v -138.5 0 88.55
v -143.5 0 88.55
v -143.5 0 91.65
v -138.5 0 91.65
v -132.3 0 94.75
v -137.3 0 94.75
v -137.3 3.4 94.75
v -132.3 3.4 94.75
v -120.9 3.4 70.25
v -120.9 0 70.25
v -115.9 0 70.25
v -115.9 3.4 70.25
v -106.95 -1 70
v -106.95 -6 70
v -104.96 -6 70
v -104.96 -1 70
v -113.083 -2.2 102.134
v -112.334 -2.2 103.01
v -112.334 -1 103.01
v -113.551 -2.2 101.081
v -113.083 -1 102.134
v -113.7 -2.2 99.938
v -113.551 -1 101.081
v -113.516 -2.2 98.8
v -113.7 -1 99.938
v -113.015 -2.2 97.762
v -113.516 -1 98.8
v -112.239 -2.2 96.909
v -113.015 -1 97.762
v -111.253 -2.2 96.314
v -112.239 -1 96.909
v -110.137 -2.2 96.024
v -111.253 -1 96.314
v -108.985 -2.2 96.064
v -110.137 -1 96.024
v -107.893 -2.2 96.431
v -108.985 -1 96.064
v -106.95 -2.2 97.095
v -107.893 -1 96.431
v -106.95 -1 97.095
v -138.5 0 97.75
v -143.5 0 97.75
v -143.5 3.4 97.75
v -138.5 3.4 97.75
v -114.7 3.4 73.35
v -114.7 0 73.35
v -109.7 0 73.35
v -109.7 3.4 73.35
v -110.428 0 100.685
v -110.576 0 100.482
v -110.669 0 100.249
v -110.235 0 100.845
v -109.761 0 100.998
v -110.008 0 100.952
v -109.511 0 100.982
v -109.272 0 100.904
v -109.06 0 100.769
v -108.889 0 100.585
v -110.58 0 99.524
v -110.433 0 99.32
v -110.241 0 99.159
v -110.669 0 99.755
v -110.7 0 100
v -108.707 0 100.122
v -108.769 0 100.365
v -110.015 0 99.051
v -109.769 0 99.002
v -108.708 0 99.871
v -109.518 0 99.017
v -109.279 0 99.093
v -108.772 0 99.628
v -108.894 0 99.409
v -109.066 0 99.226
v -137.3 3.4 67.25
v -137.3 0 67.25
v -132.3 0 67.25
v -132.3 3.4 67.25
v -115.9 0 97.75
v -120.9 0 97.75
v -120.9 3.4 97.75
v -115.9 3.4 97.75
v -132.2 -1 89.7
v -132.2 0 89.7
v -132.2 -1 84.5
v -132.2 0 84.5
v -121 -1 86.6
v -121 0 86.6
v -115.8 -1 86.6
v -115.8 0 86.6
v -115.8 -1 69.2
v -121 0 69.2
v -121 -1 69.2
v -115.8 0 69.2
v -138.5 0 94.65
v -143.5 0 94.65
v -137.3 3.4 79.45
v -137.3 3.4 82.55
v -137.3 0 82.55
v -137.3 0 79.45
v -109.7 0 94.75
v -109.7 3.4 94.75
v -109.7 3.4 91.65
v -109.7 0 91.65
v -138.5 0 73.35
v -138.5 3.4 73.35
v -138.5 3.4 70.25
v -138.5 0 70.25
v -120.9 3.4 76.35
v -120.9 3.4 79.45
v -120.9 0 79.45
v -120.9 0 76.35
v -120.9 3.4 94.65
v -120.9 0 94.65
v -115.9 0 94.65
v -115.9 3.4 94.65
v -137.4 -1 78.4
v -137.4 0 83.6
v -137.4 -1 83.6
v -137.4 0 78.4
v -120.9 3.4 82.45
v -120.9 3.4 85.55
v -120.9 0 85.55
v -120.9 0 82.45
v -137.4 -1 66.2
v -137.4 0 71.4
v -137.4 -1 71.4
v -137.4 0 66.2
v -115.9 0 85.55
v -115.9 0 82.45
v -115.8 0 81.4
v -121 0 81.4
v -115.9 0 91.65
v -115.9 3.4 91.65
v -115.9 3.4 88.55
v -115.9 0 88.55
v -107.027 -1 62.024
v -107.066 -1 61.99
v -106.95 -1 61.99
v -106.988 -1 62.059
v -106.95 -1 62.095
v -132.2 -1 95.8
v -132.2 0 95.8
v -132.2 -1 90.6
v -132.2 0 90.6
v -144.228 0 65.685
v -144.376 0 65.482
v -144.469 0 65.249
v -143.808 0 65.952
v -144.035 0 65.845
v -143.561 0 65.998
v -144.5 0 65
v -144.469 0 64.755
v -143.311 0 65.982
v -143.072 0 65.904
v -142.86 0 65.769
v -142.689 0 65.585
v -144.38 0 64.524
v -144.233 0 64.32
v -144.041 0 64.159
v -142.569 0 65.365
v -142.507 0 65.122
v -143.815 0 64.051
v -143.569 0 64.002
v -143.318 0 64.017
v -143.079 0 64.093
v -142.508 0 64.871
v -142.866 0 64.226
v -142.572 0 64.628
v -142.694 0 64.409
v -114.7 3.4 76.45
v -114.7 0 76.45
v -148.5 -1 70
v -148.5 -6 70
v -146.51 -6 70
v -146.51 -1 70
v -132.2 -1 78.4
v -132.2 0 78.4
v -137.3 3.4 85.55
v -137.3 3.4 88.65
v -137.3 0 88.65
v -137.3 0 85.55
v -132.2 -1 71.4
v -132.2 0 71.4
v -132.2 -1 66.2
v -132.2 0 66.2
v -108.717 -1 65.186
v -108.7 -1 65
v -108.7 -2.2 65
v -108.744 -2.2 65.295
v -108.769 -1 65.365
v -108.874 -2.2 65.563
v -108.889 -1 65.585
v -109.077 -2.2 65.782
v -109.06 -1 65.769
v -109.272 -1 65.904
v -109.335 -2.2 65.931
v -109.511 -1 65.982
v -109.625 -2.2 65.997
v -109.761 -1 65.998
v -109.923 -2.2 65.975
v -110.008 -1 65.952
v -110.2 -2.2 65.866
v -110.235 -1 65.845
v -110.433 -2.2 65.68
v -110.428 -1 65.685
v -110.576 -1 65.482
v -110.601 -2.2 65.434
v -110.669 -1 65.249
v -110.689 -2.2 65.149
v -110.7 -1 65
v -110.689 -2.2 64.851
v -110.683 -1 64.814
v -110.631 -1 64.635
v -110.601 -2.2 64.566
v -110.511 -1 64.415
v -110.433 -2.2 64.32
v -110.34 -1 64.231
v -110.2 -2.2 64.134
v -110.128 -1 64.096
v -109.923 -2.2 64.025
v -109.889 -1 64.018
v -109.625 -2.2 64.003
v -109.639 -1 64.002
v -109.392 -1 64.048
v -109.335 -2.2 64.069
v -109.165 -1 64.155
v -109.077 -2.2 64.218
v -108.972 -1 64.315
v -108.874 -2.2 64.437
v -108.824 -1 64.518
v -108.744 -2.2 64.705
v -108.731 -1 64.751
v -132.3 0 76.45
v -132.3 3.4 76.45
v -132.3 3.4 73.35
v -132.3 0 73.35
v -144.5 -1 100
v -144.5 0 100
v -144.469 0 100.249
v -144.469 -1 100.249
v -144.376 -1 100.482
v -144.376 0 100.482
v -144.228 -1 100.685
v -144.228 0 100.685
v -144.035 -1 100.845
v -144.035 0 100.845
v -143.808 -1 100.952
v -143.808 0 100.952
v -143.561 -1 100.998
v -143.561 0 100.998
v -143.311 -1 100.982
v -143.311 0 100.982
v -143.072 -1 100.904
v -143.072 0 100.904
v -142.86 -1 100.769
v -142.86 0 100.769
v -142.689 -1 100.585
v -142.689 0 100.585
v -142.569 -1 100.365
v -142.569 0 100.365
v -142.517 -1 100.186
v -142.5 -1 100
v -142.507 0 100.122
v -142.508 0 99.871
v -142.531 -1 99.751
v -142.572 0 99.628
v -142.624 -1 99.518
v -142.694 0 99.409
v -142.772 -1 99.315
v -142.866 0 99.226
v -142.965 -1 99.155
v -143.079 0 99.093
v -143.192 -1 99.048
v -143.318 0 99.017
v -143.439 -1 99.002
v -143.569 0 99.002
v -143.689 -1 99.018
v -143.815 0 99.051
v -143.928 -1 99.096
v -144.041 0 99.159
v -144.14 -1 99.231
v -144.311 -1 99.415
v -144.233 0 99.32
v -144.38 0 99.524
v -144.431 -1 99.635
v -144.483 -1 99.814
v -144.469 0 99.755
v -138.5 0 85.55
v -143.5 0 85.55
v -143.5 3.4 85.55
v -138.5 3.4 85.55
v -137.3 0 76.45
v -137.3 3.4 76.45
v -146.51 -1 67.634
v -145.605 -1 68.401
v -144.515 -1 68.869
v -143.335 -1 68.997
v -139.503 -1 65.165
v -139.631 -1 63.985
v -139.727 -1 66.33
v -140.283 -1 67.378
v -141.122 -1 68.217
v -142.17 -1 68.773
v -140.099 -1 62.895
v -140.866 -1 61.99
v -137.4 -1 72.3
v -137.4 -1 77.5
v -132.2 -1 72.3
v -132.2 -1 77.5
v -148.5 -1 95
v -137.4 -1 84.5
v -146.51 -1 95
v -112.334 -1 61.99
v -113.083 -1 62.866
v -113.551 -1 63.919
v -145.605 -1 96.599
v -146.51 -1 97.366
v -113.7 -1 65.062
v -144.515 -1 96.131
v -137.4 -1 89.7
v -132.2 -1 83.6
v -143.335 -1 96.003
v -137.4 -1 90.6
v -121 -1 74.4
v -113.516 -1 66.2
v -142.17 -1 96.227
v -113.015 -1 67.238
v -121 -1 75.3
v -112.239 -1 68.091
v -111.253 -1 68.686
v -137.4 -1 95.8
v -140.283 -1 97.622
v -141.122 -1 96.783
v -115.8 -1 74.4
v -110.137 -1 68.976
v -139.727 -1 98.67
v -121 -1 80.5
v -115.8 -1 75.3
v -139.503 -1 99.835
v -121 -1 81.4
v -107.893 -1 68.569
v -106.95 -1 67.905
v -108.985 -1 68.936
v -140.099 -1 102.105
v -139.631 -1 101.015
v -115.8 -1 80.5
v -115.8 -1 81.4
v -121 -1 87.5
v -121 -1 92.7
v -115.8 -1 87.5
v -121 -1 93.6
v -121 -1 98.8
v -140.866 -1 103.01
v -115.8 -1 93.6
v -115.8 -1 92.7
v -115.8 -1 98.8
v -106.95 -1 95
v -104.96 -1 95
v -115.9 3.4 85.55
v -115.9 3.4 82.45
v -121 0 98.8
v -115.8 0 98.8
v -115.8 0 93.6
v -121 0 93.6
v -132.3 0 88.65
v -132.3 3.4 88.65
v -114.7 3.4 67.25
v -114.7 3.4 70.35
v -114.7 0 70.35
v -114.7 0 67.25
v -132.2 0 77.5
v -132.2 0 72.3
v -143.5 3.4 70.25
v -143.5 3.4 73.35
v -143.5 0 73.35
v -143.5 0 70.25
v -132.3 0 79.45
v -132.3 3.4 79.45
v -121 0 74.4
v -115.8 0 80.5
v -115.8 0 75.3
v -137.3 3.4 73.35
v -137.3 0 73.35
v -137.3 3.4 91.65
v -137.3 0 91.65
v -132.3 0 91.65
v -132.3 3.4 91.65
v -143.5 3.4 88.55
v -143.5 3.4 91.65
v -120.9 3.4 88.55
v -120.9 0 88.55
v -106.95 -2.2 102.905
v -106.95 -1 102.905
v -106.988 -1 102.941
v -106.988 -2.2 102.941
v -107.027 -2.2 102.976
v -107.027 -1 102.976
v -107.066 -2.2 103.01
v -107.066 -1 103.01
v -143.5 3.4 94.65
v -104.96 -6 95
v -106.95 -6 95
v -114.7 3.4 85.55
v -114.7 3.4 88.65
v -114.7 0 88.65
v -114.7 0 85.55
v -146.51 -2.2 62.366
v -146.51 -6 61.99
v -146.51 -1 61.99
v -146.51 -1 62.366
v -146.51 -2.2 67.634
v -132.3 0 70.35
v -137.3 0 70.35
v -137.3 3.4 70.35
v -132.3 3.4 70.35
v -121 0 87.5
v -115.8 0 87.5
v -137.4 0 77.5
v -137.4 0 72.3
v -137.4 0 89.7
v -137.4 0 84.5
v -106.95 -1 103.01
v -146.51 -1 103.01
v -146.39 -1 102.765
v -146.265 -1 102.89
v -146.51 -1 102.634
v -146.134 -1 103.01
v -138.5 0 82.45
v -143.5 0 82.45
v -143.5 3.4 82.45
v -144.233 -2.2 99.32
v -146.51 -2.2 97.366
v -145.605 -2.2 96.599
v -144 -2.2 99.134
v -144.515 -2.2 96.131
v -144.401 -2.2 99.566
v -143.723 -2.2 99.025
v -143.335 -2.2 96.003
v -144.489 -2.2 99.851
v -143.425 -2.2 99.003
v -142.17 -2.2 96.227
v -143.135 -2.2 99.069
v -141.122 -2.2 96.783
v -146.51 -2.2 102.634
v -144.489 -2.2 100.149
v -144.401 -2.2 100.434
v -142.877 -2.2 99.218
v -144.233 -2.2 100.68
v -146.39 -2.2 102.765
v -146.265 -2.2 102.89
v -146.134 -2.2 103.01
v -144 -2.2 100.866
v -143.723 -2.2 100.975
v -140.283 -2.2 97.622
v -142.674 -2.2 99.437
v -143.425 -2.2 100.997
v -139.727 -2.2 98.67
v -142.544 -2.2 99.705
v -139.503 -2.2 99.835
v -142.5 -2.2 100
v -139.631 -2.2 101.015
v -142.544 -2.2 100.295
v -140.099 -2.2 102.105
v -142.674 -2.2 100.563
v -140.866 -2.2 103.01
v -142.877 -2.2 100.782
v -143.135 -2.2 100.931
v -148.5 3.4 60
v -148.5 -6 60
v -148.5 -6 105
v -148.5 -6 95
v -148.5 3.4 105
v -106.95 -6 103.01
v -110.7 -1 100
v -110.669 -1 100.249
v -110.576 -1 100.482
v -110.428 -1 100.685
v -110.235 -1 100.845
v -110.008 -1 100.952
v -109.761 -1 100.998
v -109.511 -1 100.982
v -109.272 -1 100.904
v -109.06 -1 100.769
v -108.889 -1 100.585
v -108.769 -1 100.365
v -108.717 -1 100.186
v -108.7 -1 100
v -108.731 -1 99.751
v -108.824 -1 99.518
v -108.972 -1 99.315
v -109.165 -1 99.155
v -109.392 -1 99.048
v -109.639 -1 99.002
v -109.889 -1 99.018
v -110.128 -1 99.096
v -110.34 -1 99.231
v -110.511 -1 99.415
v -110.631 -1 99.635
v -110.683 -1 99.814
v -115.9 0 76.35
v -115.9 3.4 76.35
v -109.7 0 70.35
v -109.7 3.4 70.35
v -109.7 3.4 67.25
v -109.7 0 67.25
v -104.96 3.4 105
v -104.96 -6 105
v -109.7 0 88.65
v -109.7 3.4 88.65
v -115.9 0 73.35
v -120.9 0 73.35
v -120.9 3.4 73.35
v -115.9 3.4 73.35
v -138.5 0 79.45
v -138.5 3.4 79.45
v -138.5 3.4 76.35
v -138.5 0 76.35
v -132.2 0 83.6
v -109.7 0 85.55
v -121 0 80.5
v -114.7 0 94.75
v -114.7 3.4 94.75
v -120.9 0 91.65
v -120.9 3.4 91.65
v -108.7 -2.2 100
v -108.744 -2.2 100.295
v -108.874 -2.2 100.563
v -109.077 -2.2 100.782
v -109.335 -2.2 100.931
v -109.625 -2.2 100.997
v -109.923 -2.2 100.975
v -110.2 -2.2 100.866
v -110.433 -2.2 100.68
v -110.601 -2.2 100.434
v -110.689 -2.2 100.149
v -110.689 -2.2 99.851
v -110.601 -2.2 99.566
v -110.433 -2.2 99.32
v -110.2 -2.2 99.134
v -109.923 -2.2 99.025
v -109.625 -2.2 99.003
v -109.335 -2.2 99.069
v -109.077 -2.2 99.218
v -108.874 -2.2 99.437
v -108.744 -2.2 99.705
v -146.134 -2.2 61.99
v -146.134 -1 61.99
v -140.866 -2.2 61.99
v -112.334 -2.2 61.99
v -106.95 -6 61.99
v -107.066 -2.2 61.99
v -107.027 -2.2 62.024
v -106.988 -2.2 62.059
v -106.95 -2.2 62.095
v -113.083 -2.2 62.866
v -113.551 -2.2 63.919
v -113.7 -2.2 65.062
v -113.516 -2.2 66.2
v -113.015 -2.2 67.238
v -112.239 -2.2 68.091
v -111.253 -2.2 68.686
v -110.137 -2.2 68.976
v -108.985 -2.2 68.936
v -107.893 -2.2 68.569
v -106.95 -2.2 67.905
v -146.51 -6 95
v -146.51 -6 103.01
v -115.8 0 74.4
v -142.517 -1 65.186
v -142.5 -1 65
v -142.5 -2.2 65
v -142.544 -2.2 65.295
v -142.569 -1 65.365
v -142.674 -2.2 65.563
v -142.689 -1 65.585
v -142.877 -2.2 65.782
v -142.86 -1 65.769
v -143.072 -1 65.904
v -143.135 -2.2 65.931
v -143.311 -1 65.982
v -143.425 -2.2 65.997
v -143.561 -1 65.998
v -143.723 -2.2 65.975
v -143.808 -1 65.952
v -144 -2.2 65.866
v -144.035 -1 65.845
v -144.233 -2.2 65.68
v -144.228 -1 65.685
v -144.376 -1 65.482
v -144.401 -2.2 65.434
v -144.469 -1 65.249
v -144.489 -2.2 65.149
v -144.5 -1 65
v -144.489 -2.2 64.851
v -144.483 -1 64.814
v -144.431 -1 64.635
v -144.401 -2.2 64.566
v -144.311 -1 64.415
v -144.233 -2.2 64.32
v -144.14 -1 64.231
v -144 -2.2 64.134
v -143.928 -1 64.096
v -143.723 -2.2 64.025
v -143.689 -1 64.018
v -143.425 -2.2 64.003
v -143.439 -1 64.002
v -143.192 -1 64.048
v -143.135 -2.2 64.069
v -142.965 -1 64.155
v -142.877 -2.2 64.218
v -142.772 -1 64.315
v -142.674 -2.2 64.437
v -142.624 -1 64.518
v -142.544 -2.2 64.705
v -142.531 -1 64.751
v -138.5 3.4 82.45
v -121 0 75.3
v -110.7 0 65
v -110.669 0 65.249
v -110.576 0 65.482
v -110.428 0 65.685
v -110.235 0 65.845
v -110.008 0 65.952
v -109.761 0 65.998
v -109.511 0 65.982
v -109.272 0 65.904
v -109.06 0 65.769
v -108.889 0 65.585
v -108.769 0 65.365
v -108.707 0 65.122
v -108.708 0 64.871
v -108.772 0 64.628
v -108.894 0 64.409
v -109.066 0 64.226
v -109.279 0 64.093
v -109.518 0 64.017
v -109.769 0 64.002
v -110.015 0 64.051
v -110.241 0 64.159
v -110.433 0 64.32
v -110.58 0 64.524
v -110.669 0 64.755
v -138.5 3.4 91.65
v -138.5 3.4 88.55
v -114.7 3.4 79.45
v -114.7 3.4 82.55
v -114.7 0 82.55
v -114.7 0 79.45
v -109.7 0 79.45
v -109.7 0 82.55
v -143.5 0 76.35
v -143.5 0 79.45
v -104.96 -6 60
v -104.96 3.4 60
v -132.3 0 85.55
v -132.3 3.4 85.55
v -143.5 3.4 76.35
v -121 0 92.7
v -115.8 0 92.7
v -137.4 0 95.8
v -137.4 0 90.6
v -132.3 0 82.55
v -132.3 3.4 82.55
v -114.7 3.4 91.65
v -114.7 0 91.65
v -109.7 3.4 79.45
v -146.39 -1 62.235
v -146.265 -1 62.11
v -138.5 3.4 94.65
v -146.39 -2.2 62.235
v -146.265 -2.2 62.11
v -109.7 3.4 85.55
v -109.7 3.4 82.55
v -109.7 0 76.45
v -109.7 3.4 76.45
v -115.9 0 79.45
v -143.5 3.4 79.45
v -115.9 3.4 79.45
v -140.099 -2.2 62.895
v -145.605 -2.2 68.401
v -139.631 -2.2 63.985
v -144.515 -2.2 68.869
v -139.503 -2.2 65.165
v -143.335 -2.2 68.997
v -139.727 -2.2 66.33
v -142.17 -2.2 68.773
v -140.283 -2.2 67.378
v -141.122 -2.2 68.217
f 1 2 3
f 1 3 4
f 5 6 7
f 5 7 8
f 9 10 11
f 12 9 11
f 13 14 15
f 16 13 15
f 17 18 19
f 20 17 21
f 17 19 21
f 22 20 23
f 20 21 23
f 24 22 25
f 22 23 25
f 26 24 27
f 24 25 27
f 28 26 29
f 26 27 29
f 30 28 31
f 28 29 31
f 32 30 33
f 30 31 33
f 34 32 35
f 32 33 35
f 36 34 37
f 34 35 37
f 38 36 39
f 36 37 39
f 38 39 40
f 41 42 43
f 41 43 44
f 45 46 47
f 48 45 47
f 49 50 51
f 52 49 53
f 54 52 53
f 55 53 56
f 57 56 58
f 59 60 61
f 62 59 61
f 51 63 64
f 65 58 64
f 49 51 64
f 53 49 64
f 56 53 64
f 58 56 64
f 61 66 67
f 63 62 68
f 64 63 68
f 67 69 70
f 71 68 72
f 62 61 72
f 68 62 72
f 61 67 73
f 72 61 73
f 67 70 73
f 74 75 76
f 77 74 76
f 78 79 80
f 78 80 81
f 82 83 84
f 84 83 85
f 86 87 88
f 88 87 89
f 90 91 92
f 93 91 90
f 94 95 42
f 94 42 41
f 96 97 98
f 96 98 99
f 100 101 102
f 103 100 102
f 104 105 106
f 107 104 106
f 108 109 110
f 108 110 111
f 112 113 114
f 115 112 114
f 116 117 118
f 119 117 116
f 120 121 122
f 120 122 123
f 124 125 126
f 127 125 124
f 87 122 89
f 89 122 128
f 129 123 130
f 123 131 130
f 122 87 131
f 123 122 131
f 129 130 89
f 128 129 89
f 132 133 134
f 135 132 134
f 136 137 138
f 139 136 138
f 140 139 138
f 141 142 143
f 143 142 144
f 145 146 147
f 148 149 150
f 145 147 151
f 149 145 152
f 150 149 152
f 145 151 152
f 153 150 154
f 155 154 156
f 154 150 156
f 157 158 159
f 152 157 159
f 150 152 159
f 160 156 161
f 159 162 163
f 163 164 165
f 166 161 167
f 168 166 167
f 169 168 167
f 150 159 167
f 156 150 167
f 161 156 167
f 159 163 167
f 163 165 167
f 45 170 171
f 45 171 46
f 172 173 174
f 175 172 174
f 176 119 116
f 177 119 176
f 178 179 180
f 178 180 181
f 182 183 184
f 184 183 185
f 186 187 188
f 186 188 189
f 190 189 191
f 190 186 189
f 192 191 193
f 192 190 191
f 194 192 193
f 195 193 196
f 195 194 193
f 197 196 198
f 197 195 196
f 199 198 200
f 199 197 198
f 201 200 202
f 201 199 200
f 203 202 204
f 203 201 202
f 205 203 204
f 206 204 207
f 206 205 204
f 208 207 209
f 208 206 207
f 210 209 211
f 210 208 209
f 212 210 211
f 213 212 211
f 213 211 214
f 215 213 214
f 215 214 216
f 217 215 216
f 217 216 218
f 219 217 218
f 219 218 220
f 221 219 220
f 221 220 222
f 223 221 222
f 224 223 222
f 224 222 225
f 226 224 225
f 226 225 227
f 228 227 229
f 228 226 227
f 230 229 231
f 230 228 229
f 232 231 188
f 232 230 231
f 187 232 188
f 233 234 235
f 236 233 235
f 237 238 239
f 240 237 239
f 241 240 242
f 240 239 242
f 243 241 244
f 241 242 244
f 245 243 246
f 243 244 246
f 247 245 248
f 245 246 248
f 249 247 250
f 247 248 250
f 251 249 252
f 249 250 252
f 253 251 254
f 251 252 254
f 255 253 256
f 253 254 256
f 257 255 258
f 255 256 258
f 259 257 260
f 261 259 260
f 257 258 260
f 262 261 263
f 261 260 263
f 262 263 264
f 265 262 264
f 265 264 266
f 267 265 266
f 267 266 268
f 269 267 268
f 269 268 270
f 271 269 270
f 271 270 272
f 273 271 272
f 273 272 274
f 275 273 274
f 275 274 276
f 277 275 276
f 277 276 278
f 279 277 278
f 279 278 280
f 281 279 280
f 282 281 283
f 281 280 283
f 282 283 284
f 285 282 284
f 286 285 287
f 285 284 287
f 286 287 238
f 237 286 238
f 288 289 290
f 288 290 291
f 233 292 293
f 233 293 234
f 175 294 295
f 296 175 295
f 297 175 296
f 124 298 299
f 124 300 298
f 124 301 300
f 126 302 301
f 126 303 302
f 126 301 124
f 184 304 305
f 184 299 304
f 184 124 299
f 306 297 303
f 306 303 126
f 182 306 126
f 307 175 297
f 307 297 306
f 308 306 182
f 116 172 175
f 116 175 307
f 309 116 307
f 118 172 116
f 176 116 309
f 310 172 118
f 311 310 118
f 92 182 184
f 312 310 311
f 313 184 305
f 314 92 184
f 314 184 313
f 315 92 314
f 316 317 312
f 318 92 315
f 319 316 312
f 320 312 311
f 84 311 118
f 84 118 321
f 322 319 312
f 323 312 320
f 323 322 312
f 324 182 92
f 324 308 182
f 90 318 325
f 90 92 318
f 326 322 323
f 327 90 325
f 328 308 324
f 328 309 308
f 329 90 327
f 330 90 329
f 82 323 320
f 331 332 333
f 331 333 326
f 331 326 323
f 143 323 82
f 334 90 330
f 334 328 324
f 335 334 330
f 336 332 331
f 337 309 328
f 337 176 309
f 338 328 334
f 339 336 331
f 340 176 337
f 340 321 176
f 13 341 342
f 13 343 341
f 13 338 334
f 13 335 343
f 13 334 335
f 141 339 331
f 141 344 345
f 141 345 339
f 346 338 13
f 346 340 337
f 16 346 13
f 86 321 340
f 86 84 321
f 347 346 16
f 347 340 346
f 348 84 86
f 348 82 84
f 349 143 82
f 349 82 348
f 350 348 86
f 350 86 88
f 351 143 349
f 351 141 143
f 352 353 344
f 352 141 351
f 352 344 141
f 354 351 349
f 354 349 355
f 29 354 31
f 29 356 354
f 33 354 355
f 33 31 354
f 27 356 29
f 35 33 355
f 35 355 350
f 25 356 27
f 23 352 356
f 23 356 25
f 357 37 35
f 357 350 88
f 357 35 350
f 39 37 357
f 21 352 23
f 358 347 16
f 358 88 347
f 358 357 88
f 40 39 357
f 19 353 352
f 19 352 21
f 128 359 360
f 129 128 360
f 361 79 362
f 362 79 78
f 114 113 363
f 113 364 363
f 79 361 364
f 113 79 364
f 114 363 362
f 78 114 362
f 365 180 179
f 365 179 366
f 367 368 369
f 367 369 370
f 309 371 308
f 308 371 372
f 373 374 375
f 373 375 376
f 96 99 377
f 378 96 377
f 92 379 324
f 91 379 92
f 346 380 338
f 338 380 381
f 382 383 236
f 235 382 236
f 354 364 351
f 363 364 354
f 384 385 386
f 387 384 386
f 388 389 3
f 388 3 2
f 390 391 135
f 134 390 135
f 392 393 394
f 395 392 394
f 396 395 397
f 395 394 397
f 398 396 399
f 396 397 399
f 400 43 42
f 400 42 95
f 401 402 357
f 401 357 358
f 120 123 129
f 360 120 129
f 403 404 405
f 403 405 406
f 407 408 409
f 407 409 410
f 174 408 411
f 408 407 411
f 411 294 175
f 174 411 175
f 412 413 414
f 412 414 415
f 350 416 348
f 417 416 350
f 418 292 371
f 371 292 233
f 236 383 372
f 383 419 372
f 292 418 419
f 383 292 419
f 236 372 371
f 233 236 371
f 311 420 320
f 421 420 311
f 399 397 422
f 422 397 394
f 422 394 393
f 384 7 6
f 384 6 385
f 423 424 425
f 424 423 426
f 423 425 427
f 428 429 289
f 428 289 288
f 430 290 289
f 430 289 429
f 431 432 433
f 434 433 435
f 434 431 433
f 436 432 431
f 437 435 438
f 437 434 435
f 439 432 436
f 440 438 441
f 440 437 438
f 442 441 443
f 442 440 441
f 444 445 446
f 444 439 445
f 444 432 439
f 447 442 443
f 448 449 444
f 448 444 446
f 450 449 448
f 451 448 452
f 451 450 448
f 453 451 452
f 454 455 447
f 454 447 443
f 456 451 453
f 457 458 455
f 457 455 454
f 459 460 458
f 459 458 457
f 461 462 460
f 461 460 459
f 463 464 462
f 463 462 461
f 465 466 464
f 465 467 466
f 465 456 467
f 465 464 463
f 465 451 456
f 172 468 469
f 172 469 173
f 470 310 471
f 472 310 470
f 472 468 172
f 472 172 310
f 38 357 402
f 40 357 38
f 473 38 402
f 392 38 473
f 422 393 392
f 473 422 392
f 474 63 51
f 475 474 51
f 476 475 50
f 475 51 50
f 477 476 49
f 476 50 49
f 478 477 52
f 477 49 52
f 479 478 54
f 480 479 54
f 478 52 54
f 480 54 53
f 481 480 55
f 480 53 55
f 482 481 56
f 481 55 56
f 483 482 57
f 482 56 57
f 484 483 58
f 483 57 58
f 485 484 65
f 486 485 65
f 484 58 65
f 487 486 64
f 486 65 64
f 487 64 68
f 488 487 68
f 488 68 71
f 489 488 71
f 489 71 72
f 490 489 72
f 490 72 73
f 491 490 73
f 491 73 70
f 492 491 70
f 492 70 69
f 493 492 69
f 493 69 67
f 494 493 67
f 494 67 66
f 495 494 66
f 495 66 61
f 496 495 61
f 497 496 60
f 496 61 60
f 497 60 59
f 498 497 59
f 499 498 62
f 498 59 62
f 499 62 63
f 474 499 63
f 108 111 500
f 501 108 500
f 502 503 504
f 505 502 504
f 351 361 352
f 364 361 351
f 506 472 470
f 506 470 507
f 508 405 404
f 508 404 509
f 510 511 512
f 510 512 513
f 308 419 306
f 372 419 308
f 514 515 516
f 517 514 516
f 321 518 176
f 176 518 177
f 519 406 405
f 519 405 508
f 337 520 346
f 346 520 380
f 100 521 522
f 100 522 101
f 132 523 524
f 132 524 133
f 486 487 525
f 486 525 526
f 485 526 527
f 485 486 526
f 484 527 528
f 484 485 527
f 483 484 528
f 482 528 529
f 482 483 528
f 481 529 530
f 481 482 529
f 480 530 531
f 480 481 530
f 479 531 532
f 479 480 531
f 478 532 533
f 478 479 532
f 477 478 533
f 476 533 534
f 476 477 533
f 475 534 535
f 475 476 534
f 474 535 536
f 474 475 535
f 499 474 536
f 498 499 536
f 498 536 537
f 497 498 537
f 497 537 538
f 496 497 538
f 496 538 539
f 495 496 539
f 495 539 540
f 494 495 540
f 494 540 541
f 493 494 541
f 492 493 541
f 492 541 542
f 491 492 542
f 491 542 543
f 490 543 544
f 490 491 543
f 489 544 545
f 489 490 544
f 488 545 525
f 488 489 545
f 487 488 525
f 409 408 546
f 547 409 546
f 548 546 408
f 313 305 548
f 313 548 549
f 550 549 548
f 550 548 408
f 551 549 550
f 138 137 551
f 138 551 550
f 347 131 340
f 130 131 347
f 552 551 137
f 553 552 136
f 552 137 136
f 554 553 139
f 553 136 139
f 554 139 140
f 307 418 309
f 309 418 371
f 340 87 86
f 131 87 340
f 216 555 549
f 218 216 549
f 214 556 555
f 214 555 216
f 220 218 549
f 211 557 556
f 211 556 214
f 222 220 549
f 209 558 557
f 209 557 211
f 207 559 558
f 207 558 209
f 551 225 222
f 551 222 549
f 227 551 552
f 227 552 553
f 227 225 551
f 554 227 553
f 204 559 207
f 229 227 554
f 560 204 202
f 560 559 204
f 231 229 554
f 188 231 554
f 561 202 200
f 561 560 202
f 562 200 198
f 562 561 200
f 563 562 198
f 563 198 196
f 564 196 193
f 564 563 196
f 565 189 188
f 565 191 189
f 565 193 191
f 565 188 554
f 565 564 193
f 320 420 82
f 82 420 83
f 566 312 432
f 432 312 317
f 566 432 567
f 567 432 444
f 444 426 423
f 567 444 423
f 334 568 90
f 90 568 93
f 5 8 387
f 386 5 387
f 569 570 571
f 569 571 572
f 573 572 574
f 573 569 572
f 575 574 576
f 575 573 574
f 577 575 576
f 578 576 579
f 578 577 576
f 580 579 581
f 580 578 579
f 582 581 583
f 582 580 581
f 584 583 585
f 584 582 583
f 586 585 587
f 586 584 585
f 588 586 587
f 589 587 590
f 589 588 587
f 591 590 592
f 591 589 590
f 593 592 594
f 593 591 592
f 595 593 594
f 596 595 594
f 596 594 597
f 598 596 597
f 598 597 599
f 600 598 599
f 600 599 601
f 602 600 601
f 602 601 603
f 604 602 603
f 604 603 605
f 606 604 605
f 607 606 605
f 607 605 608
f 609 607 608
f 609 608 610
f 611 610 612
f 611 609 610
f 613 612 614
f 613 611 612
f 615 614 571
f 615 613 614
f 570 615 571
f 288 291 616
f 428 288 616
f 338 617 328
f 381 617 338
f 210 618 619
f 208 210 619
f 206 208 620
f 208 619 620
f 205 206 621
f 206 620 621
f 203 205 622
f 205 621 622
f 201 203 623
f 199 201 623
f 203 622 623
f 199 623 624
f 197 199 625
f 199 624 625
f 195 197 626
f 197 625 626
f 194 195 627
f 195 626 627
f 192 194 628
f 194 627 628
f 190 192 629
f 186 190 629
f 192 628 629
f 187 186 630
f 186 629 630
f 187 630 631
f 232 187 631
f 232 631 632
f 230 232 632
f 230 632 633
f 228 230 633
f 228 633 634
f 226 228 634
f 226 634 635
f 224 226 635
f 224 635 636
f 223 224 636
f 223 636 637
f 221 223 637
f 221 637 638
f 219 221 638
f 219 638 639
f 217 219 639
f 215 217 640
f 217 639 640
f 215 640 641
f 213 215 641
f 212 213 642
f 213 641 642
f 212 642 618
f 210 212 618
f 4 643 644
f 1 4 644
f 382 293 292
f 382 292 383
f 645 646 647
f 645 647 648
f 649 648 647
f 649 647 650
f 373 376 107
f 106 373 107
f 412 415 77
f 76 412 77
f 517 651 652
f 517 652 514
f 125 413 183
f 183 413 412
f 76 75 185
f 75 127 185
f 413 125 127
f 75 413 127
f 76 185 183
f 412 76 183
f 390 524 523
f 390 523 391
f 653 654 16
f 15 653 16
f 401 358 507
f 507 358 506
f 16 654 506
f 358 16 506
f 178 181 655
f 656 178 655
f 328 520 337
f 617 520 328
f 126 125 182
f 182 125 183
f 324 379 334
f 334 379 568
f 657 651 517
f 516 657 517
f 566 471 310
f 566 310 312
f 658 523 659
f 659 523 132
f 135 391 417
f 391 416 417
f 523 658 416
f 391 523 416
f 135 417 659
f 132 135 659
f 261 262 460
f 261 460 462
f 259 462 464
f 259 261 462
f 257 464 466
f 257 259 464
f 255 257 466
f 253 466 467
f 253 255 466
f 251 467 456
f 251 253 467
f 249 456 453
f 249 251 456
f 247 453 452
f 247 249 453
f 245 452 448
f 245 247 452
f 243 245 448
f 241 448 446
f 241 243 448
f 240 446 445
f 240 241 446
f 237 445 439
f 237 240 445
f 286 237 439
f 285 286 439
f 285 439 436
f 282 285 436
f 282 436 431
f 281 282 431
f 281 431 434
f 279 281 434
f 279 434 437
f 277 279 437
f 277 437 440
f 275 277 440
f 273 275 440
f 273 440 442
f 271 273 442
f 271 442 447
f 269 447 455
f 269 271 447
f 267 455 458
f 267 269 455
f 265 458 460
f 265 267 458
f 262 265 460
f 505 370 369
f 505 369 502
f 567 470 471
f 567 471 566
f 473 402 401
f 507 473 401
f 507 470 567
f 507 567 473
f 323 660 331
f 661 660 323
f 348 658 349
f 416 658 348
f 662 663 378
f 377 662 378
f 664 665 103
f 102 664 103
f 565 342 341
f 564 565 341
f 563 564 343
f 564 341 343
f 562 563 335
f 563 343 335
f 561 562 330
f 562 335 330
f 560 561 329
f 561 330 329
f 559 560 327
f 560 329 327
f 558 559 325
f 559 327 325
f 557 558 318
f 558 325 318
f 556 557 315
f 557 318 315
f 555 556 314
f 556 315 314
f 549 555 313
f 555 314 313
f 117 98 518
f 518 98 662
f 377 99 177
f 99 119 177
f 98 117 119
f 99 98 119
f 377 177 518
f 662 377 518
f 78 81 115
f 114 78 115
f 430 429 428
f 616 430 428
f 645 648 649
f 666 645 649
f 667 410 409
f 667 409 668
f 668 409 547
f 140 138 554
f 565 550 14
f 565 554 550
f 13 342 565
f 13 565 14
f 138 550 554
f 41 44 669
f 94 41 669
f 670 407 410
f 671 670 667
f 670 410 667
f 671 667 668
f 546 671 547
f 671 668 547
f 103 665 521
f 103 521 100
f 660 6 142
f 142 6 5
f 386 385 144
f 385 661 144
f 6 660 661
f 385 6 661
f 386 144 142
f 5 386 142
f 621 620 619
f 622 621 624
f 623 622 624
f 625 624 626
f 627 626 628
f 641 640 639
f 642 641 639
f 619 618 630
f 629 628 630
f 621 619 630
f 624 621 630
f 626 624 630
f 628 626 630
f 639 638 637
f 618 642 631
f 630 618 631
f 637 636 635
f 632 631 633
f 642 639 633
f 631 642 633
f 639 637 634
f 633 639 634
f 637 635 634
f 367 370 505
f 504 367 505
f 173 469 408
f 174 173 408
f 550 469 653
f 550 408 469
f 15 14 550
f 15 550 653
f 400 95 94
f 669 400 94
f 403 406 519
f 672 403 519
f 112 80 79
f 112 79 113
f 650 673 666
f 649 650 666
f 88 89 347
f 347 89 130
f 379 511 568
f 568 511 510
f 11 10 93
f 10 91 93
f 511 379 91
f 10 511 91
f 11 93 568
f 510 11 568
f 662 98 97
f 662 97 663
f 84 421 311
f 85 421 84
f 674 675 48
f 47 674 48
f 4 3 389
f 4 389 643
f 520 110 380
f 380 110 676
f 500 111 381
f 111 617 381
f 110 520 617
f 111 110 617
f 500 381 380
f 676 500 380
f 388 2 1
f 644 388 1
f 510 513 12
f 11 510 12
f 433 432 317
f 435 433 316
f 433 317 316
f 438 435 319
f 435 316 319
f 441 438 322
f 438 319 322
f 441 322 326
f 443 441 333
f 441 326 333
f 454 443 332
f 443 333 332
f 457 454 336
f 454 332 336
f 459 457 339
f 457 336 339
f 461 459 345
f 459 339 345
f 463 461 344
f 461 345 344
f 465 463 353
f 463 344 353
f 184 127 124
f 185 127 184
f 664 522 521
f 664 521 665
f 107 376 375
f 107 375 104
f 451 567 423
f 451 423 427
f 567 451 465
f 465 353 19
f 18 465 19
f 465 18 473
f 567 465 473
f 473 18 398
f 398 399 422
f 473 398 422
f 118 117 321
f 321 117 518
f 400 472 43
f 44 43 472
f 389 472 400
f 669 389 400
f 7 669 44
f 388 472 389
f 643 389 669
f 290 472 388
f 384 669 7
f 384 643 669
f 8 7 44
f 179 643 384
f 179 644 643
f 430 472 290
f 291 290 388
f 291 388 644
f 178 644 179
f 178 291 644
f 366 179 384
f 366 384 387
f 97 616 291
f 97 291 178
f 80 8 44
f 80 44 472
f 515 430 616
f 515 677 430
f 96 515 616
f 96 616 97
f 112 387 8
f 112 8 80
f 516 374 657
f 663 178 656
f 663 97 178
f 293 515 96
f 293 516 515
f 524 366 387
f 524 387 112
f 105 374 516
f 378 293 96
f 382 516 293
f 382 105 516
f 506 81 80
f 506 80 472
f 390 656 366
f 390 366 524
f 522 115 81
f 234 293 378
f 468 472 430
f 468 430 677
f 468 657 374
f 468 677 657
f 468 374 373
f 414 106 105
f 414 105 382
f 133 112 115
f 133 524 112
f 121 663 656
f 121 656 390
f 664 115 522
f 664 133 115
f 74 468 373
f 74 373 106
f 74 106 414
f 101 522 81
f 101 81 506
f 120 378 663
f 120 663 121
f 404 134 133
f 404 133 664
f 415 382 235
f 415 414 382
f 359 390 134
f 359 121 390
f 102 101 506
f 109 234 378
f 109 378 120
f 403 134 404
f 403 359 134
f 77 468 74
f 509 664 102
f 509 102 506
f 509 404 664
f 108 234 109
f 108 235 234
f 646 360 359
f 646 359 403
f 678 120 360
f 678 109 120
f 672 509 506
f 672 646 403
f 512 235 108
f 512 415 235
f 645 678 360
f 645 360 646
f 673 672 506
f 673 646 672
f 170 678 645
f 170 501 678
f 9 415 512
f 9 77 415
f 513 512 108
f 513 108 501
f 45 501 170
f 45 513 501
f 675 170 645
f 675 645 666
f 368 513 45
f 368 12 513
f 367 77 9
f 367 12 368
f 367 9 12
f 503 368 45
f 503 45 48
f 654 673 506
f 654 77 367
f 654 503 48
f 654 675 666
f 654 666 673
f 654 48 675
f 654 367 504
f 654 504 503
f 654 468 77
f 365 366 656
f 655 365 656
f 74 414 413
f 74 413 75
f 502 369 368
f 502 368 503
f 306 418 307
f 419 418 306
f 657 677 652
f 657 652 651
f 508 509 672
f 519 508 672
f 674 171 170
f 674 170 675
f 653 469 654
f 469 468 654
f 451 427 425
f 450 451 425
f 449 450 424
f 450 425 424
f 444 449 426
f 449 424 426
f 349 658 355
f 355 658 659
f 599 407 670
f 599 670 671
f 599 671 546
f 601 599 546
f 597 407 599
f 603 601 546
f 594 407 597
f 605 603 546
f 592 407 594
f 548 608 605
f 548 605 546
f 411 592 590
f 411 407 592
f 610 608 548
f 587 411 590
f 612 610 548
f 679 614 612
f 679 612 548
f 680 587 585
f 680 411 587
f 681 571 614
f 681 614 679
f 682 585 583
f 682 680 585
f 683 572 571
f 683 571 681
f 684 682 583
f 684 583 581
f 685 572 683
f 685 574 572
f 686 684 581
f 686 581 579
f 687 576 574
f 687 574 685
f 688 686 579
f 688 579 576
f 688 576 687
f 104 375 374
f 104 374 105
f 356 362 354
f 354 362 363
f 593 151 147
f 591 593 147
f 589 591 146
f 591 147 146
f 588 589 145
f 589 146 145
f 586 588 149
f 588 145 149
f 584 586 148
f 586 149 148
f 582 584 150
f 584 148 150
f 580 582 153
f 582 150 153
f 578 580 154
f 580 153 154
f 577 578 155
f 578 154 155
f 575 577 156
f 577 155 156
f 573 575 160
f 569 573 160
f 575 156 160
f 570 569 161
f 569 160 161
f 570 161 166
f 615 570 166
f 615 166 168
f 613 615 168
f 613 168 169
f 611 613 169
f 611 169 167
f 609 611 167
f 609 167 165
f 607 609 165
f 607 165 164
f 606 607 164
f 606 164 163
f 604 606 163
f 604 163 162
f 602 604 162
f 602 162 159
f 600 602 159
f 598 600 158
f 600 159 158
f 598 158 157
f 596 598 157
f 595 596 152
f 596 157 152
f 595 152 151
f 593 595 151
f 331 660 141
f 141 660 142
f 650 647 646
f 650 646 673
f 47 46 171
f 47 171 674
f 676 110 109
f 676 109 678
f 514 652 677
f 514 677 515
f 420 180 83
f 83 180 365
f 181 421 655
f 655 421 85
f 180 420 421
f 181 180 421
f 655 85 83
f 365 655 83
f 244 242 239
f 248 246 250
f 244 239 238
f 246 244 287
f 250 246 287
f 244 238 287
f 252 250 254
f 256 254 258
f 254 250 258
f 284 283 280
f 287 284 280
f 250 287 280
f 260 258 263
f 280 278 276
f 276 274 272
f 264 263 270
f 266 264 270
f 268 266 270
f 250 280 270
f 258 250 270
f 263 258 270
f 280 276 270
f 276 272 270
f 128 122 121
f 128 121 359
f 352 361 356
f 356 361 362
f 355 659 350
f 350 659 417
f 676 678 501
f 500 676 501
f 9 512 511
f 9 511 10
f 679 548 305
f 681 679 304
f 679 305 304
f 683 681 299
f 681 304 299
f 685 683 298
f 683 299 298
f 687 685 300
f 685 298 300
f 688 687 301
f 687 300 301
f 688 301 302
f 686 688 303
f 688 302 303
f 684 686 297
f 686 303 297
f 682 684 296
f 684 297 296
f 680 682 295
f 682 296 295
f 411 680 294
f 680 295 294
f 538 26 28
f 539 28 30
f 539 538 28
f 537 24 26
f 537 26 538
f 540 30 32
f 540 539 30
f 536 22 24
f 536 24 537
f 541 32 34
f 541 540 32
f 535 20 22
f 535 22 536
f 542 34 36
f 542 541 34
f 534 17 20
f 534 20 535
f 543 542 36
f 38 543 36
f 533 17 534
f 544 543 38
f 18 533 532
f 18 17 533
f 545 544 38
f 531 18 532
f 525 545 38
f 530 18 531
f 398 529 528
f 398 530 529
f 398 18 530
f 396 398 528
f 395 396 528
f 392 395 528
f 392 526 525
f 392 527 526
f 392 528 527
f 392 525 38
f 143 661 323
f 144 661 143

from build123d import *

# Parameters (mm, degrees)
SKETCH_1_W          = 43.5396
SKETCH_1_H          = 45
SKETCH_1_W_2        = 5
SKETCH_1_H_2        = 3.1
EXTRUDE_1_DEPTH     = 3.4
SKETCH_2_W          = 43.6316
SKETCH_2_H          = 45
SKETCH_2_RX         = 1
SKETCH_2_RY         = 1
SKETCH_2_W_2        = 5.2
SKETCH_2_H_2        = 5.2
EXTRUDE_2_DEPTH     = 1
SKETCH_6_W          = 0.092
SKETCH_6_H          = 1
CUT_EXTRUDE_2_DEPTH = 46
SKETCH_3_R          = 4
SKETCH_3_R_2        = 1
EXTRUDE_3_DEPTH     = 1.2
SKETCH_4_W          = 43.5396
SKETCH_4_H          = 45
SKETCH_4_W_2        = 39.5596
SKETCH_4_H_2        = 41.02
EXTRUDE_4_DEPTH     = 5
SKETCH_5_W          = 1.99
SKETCH_5_H          = 25
CUT_EXTRUDE_1_DEPTH = 5


with BuildPart() as part:
    # Эскиз1 → Бобышка-Вытянуть1 (new body)
    with BuildSketch(Plane(origin=(0, 0, 0), x_dir=(1, 0, 0), z_dir=(0, 1, 0))):
        with Locations((-126.7302, -82.5)):
            Rectangle(SKETCH_1_W, SKETCH_1_H)
        with Locations((-141, -96.2003)):
            Rectangle(SKETCH_1_W_2, SKETCH_1_H_2, mode=Mode.SUBTRACT)
        with Locations((-118.4, -96.2003)):
            Rectangle(SKETCH_1_W_2, SKETCH_1_H_2, mode=Mode.SUBTRACT)
        with Locations((-112.2, -93.2003)):
            Rectangle(SKETCH_1_W_2, SKETCH_1_H_2, mode=Mode.SUBTRACT)
        with Locations((-134.8, -93.2003)):
            Rectangle(SKETCH_1_W_2, SKETCH_1_H_2, mode=Mode.SUBTRACT)
        with Locations((-112.2, -87.1003)):
            Rectangle(SKETCH_1_W_2, SKETCH_1_H_2, mode=Mode.SUBTRACT)
        with Locations((-134.8, -87.1003)):
            Rectangle(SKETCH_1_W_2, SKETCH_1_H_2, mode=Mode.SUBTRACT)
        with Locations((-141, -90.1003)):
            Rectangle(SKETCH_1_W_2, SKETCH_1_H_2, mode=Mode.SUBTRACT)
        with Locations((-118.4, -90.1003)):
            Rectangle(SKETCH_1_W_2, SKETCH_1_H_2, mode=Mode.SUBTRACT)
        with Locations((-112.2, -74.9003)):
            Rectangle(SKETCH_1_W_2, SKETCH_1_H_2, mode=Mode.SUBTRACT)
        with Locations((-134.8, -74.9003)):
            Rectangle(SKETCH_1_W_2, SKETCH_1_H_2, mode=Mode.SUBTRACT)
        with Locations((-141, -77.9003)):
            Rectangle(SKETCH_1_W_2, SKETCH_1_H_2, mode=Mode.SUBTRACT)
        with Locations((-118.4, -77.9003)):
            Rectangle(SKETCH_1_W_2, SKETCH_1_H_2, mode=Mode.SUBTRACT)
        with Locations((-141, -84.0003)):
            Rectangle(SKETCH_1_W_2, SKETCH_1_H_2, mode=Mode.SUBTRACT)
        with Locations((-118.4, -84.0003)):
            Rectangle(SKETCH_1_W_2, SKETCH_1_H_2, mode=Mode.SUBTRACT)
        with Locations((-112.2, -81.0003)):
            Rectangle(SKETCH_1_W_2, SKETCH_1_H_2, mode=Mode.SUBTRACT)
        with Locations((-134.8, -81.0003)):
            Rectangle(SKETCH_1_W_2, SKETCH_1_H_2, mode=Mode.SUBTRACT)
        with Locations((-141, -71.8003)):
            Rectangle(SKETCH_1_W_2, SKETCH_1_H_2, mode=Mode.SUBTRACT)
        with Locations((-118.4, -71.8003)):
            Rectangle(SKETCH_1_W_2, SKETCH_1_H_2, mode=Mode.SUBTRACT)
        with Locations((-112.2, -68.8003)):
            Rectangle(SKETCH_1_W_2, SKETCH_1_H_2, mode=Mode.SUBTRACT)
        with Locations((-134.8, -68.8003)):
            Rectangle(SKETCH_1_W_2, SKETCH_1_H_2, mode=Mode.SUBTRACT)
    extrude(amount=EXTRUDE_1_DEPTH)

    # Эскиз2 → Бобышка-Вытянуть2 (add)
    with BuildSketch(Plane(origin=(0, 0, 0), x_dir=(1, 0, 0), z_dir=(0, 1, 0))):
        with Locations((-126.6842, -82.5)):
            Rectangle(SKETCH_2_W, SKETCH_2_H)
        with Locations(Location((-143.5, -65), (0, 0, 180))):
            Ellipse(SKETCH_2_RX, SKETCH_2_RY, mode=Mode.SUBTRACT)
        with Locations(Location((-143.5, -100), (0, 0, 180))):
            Ellipse(SKETCH_2_RX, SKETCH_2_RY, mode=Mode.SUBTRACT)
        with Locations(Location((-109.7, -65), (0, 0, 180))):
            Ellipse(SKETCH_2_RX, SKETCH_2_RY, mode=Mode.SUBTRACT)
        with Locations(Location((-109.7, -100), (0, 0, 180))):
            Ellipse(SKETCH_2_RX, SKETCH_2_RY, mode=Mode.SUBTRACT)
        with Locations((-134.8, -68.8)):
            Rectangle(SKETCH_2_W_2, SKETCH_2_H_2, mode=Mode.SUBTRACT)
        with Locations((-134.8, -74.9)):
            Rectangle(SKETCH_2_W_2, SKETCH_2_H_2, mode=Mode.SUBTRACT)
        with Locations((-134.8, -81)):
            Rectangle(SKETCH_2_W_2, SKETCH_2_H_2, mode=Mode.SUBTRACT)
        with Locations((-134.8, -87.1)):
            Rectangle(SKETCH_2_W_2, SKETCH_2_H_2, mode=Mode.SUBTRACT)
        with Locations((-134.8, -93.2003)):
            Rectangle(SKETCH_2_W_2, SKETCH_2_H_2, mode=Mode.SUBTRACT)
        with Locations((-118.4, -71.8003)):
            Rectangle(SKETCH_2_W_2, SKETCH_2_H_2, mode=Mode.SUBTRACT)
        with Locations((-118.4, -77.9003)):
            Rectangle(SKETCH_2_W_2, SKETCH_2_H_2, mode=Mode.SUBTRACT)
        with Locations((-118.4, -84.0003)):
            Rectangle(SKETCH_2_W_2, SKETCH_2_H_2, mode=Mode.SUBTRACT)
        with Locations((-118.4, -90.1003)):
            Rectangle(SKETCH_2_W_2, SKETCH_2_H_2, mode=Mode.SUBTRACT)
        with Locations((-118.4, -96.2003)):
            Rectangle(SKETCH_2_W_2, SKETCH_2_H_2, mode=Mode.SUBTRACT)
    extrude(amount=-EXTRUDE_2_DEPTH)

    # Эскиз6 → Вырез-Вытянуть2 (cut, through all)
    with BuildSketch(Plane(origin=(0, 0, 60), x_dir=(-1, 0, 0), z_dir=(0, 0, -1))):
        with Locations((104.9144, -0.5)):
            Rectangle(SKETCH_6_W, SKETCH_6_H)
    extrude(amount=-CUT_EXTRUDE_2_DEPTH, mode=Mode.SUBTRACT)

    # Эскиз3 → Бобышка-Вытянуть3 (add)
    with BuildSketch(Plane.XZ.offset(1)):
        with Locations((-143.5, 100)):
            Circle(SKETCH_3_R)
        with Locations((-143.5, 100)):
            Circle(SKETCH_3_R_2, mode=Mode.SUBTRACT)
        with Locations((-109.7, 100)):
            Circle(SKETCH_3_R)
        with Locations((-109.7, 100)):
            Circle(SKETCH_3_R_2, mode=Mode.SUBTRACT)
        with Locations((-143.5, 65)):
            Circle(SKETCH_3_R)
        with Locations((-143.5, 65)):
            Circle(SKETCH_3_R_2, mode=Mode.SUBTRACT)
        with Locations((-109.7, 65)):
            Circle(SKETCH_3_R)
        with Locations((-109.7, 65)):
            Circle(SKETCH_3_R_2, mode=Mode.SUBTRACT)
    extrude(amount=EXTRUDE_3_DEPTH)

    # Эскиз4 → Бобышка-Вытянуть4 (add)
    with BuildSketch(Plane.XZ.offset(1)):
        with Locations((-126.7302, 82.5)):
            Rectangle(SKETCH_4_W, SKETCH_4_H)
        with Locations((-126.7302, 82.5)):
            Rectangle(SKETCH_4_W_2, SKETCH_4_H_2, mode=Mode.SUBTRACT)
    extrude(amount=EXTRUDE_4_DEPTH)

    # Эскиз5 → Вырез-Вытянуть1 (cut)
    with BuildSketch(Plane.XZ.offset(6)):
        with Locations((-147.505, 82.5)):
            Rectangle(SKETCH_5_W, SKETCH_5_H)
        with Locations((-105.9554, 82.5)):
            Rectangle(SKETCH_5_W, SKETCH_5_H)
    extrude(amount=-CUT_EXTRUDE_1_DEPTH, mode=Mode.SUBTRACT)


solid = part.part
